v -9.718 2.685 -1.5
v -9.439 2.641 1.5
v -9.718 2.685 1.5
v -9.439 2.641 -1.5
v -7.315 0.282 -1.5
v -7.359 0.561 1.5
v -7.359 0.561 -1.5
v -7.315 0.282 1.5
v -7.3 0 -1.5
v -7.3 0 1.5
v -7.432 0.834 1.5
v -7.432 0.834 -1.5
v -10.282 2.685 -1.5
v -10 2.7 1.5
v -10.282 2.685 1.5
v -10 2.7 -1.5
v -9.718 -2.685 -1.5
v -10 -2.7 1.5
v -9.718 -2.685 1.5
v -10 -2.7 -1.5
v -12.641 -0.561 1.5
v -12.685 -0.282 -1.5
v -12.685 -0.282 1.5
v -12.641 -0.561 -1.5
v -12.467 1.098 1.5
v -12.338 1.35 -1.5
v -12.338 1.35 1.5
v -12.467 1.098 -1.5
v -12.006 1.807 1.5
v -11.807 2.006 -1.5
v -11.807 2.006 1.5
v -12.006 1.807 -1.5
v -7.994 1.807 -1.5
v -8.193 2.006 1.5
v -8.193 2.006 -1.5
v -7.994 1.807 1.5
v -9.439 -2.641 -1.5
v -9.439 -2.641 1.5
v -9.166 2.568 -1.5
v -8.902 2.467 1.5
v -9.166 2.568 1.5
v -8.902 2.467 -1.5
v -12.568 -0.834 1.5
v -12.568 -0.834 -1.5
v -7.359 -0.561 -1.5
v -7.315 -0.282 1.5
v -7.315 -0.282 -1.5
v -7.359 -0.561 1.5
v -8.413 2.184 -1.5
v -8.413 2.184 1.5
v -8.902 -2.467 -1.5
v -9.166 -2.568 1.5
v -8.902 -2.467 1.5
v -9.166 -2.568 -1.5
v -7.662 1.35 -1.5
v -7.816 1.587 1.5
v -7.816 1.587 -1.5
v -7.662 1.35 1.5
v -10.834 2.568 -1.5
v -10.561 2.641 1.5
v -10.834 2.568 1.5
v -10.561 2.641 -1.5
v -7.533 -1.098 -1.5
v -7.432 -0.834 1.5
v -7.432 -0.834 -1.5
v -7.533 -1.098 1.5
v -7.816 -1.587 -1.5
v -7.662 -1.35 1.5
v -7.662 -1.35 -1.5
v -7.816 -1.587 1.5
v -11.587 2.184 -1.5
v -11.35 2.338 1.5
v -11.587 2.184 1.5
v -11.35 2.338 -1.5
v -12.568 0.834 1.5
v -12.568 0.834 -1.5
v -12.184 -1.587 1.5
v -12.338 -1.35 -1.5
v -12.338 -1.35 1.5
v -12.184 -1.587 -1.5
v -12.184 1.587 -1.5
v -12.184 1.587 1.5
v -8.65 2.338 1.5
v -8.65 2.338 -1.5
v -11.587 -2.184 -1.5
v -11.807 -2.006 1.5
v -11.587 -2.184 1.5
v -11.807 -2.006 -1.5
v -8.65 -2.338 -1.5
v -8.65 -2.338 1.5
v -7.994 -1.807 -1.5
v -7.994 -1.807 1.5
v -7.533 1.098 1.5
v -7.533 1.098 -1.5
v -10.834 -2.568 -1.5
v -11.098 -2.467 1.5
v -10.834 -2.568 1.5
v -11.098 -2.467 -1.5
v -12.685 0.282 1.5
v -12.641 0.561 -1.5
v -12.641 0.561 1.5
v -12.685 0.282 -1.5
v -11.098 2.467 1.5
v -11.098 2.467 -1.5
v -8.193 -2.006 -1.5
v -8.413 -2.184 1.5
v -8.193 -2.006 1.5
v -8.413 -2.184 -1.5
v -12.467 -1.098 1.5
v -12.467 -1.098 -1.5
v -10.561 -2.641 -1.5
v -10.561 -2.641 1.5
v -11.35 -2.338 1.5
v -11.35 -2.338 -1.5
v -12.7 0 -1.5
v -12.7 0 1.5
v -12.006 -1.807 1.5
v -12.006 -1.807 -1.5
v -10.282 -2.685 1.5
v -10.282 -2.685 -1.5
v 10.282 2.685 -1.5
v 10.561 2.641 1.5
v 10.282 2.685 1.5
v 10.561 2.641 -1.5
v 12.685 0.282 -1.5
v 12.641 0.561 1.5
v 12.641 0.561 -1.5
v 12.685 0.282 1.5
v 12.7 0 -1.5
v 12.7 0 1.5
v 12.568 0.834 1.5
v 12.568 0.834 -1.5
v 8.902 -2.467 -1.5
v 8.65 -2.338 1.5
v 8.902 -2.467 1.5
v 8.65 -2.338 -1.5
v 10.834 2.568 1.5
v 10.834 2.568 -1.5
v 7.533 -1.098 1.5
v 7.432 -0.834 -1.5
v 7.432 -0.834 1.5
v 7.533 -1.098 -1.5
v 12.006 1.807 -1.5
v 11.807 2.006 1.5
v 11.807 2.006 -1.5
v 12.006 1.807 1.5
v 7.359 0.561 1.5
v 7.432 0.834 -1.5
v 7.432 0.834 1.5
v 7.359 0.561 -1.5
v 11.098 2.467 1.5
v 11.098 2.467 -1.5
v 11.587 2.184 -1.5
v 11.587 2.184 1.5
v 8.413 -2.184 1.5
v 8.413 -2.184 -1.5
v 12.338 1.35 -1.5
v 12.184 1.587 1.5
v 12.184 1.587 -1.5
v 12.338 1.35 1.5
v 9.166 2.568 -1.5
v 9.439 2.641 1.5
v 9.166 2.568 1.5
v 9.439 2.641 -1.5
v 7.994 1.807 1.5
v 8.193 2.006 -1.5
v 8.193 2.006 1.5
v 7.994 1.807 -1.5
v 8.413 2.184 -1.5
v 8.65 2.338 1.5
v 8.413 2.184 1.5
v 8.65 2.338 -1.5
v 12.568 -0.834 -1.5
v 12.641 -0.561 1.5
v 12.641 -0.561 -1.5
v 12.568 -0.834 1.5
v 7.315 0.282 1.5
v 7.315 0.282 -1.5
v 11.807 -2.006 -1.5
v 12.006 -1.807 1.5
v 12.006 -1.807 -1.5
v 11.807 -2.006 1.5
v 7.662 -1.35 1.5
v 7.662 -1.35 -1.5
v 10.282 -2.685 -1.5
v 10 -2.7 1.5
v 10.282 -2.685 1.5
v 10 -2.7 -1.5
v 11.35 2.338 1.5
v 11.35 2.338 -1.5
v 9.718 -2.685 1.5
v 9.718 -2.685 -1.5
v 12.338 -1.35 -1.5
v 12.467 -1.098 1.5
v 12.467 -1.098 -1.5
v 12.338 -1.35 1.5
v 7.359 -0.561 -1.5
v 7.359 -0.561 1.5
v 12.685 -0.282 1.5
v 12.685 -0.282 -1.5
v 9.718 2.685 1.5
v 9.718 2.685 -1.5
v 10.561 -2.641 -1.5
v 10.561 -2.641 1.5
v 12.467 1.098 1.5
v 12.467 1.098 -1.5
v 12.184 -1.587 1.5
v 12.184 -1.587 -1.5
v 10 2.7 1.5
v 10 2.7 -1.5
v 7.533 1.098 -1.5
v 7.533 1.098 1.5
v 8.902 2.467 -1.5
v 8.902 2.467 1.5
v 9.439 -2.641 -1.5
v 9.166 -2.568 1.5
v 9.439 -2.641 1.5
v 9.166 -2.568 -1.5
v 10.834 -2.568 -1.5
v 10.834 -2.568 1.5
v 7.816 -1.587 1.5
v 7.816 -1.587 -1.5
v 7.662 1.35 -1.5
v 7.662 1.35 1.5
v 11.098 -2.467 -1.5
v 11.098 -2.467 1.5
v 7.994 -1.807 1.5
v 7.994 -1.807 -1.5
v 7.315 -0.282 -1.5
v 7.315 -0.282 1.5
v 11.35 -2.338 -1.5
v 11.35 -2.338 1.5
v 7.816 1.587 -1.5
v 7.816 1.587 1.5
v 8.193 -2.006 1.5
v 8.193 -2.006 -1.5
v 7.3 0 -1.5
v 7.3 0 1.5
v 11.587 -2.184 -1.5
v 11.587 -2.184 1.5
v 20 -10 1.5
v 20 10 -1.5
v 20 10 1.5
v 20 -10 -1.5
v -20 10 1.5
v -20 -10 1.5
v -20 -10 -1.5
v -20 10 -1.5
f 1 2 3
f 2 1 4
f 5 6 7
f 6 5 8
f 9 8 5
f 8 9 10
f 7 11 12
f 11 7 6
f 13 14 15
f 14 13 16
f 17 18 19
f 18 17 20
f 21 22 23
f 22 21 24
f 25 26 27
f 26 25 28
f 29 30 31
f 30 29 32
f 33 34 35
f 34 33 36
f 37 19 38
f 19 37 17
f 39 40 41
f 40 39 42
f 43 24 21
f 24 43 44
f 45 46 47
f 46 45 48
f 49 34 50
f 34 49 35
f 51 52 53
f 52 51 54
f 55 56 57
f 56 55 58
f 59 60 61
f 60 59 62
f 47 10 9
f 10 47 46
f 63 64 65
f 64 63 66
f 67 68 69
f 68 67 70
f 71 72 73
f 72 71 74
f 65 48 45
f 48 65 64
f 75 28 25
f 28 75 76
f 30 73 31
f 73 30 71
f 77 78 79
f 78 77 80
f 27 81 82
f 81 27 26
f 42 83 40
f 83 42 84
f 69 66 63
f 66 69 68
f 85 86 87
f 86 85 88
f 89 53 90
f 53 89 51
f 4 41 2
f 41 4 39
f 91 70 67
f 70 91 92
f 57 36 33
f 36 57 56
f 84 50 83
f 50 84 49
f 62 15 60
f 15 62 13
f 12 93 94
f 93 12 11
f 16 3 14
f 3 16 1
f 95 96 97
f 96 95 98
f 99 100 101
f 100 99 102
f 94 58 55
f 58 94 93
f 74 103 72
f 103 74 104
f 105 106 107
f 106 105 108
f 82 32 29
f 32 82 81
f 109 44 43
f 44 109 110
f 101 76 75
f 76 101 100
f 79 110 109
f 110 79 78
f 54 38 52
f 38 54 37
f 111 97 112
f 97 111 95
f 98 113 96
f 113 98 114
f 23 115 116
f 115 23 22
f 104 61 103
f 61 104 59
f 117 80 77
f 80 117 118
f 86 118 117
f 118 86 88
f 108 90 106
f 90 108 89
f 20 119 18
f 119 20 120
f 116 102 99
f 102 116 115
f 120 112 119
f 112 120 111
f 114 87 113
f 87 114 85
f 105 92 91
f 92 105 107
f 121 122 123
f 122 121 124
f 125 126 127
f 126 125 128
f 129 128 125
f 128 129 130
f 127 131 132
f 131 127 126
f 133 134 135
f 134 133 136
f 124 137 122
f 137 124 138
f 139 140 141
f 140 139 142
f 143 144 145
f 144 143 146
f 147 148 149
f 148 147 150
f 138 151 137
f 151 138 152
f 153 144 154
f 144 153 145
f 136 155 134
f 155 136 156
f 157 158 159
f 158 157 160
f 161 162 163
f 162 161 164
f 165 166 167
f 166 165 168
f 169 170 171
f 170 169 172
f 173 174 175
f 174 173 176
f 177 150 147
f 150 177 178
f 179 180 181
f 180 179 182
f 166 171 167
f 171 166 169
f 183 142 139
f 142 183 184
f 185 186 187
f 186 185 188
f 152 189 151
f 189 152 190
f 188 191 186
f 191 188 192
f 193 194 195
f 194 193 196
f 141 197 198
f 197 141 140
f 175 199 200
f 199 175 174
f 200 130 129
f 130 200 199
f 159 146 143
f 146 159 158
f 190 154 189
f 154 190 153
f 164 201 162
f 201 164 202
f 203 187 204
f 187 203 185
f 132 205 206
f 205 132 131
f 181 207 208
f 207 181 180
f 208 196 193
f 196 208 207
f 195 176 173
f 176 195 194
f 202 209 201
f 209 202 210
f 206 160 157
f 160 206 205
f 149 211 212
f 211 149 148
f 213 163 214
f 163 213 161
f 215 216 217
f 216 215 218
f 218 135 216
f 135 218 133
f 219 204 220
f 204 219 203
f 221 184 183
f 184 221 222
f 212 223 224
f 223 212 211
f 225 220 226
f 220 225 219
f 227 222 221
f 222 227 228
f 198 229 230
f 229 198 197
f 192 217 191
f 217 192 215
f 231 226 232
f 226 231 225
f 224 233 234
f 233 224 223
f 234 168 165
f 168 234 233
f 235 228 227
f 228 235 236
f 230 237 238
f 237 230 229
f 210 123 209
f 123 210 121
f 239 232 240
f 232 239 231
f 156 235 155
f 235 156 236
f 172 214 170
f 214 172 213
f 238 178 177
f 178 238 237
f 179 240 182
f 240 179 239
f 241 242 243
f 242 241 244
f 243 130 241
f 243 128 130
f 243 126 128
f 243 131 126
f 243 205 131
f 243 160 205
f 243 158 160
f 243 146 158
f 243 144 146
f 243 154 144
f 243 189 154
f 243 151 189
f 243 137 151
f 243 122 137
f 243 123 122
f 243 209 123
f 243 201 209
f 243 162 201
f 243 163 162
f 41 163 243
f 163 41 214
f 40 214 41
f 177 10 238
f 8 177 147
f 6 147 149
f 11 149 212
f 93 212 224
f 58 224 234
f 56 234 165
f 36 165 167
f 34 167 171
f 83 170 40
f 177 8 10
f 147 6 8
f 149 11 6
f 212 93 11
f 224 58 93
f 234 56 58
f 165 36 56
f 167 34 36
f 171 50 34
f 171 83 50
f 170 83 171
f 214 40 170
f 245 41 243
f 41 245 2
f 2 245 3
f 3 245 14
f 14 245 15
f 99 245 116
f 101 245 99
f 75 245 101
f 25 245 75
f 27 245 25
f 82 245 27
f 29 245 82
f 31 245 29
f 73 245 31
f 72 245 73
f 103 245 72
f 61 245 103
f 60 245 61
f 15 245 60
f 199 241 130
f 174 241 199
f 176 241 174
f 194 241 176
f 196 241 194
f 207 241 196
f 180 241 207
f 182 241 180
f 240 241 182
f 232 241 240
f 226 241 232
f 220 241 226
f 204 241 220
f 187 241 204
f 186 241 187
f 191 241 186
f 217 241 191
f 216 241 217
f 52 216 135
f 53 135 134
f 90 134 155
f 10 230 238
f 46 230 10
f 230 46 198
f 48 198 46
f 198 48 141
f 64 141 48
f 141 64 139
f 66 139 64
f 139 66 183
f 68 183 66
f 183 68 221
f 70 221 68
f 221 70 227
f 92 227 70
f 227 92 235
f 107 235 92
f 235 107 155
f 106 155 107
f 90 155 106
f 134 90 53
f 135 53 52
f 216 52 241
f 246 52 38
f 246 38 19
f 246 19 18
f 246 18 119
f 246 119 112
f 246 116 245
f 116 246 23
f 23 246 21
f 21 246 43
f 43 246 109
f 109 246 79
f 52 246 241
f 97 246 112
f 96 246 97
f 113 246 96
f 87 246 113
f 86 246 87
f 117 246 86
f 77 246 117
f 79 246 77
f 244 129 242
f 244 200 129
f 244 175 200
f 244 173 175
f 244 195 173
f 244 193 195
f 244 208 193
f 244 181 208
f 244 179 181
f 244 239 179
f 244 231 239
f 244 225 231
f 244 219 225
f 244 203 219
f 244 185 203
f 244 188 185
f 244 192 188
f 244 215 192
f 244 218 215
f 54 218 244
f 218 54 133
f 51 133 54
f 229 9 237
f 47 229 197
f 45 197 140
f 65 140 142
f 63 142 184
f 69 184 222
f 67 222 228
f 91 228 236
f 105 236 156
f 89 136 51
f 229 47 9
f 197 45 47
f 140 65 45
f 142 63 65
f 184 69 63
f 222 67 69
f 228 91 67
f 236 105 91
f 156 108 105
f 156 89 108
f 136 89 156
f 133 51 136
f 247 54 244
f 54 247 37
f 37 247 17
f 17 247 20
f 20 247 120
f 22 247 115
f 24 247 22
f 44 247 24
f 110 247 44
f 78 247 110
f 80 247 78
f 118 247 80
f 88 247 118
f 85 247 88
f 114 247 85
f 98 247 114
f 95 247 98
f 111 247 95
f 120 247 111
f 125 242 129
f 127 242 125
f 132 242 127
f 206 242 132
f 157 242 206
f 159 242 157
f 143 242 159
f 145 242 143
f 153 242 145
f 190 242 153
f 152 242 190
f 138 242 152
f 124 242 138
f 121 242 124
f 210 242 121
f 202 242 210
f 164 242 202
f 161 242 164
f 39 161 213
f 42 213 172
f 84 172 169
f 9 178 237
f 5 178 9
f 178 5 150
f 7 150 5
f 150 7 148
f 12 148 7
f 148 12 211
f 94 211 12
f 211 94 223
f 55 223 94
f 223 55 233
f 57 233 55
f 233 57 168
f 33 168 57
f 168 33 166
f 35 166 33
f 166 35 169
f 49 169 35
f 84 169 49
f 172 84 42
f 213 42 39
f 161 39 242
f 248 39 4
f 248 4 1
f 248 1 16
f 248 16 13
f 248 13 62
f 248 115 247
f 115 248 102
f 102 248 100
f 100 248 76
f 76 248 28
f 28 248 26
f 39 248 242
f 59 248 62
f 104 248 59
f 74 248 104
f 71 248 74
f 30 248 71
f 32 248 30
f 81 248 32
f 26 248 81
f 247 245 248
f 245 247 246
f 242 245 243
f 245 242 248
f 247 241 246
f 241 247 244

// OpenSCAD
// Multi-hole mounting plate.
$fn = 60;
eps = 0.02;
plate_l = 40;
plate_w = 20;
plate_t = 3;
hole_d = 5.4;
edge = 10;
difference() {
    cube([plate_l, plate_w, plate_t], center = true);
    for (i = [0 : 1])
        translate([-plate_l / 2 + edge + i * (plate_l - 2 * edge) / max(1, 1), 0, -plate_t / 2 - eps])
            cylinder(d = hole_d, h = plate_t + 2 * eps);
}
